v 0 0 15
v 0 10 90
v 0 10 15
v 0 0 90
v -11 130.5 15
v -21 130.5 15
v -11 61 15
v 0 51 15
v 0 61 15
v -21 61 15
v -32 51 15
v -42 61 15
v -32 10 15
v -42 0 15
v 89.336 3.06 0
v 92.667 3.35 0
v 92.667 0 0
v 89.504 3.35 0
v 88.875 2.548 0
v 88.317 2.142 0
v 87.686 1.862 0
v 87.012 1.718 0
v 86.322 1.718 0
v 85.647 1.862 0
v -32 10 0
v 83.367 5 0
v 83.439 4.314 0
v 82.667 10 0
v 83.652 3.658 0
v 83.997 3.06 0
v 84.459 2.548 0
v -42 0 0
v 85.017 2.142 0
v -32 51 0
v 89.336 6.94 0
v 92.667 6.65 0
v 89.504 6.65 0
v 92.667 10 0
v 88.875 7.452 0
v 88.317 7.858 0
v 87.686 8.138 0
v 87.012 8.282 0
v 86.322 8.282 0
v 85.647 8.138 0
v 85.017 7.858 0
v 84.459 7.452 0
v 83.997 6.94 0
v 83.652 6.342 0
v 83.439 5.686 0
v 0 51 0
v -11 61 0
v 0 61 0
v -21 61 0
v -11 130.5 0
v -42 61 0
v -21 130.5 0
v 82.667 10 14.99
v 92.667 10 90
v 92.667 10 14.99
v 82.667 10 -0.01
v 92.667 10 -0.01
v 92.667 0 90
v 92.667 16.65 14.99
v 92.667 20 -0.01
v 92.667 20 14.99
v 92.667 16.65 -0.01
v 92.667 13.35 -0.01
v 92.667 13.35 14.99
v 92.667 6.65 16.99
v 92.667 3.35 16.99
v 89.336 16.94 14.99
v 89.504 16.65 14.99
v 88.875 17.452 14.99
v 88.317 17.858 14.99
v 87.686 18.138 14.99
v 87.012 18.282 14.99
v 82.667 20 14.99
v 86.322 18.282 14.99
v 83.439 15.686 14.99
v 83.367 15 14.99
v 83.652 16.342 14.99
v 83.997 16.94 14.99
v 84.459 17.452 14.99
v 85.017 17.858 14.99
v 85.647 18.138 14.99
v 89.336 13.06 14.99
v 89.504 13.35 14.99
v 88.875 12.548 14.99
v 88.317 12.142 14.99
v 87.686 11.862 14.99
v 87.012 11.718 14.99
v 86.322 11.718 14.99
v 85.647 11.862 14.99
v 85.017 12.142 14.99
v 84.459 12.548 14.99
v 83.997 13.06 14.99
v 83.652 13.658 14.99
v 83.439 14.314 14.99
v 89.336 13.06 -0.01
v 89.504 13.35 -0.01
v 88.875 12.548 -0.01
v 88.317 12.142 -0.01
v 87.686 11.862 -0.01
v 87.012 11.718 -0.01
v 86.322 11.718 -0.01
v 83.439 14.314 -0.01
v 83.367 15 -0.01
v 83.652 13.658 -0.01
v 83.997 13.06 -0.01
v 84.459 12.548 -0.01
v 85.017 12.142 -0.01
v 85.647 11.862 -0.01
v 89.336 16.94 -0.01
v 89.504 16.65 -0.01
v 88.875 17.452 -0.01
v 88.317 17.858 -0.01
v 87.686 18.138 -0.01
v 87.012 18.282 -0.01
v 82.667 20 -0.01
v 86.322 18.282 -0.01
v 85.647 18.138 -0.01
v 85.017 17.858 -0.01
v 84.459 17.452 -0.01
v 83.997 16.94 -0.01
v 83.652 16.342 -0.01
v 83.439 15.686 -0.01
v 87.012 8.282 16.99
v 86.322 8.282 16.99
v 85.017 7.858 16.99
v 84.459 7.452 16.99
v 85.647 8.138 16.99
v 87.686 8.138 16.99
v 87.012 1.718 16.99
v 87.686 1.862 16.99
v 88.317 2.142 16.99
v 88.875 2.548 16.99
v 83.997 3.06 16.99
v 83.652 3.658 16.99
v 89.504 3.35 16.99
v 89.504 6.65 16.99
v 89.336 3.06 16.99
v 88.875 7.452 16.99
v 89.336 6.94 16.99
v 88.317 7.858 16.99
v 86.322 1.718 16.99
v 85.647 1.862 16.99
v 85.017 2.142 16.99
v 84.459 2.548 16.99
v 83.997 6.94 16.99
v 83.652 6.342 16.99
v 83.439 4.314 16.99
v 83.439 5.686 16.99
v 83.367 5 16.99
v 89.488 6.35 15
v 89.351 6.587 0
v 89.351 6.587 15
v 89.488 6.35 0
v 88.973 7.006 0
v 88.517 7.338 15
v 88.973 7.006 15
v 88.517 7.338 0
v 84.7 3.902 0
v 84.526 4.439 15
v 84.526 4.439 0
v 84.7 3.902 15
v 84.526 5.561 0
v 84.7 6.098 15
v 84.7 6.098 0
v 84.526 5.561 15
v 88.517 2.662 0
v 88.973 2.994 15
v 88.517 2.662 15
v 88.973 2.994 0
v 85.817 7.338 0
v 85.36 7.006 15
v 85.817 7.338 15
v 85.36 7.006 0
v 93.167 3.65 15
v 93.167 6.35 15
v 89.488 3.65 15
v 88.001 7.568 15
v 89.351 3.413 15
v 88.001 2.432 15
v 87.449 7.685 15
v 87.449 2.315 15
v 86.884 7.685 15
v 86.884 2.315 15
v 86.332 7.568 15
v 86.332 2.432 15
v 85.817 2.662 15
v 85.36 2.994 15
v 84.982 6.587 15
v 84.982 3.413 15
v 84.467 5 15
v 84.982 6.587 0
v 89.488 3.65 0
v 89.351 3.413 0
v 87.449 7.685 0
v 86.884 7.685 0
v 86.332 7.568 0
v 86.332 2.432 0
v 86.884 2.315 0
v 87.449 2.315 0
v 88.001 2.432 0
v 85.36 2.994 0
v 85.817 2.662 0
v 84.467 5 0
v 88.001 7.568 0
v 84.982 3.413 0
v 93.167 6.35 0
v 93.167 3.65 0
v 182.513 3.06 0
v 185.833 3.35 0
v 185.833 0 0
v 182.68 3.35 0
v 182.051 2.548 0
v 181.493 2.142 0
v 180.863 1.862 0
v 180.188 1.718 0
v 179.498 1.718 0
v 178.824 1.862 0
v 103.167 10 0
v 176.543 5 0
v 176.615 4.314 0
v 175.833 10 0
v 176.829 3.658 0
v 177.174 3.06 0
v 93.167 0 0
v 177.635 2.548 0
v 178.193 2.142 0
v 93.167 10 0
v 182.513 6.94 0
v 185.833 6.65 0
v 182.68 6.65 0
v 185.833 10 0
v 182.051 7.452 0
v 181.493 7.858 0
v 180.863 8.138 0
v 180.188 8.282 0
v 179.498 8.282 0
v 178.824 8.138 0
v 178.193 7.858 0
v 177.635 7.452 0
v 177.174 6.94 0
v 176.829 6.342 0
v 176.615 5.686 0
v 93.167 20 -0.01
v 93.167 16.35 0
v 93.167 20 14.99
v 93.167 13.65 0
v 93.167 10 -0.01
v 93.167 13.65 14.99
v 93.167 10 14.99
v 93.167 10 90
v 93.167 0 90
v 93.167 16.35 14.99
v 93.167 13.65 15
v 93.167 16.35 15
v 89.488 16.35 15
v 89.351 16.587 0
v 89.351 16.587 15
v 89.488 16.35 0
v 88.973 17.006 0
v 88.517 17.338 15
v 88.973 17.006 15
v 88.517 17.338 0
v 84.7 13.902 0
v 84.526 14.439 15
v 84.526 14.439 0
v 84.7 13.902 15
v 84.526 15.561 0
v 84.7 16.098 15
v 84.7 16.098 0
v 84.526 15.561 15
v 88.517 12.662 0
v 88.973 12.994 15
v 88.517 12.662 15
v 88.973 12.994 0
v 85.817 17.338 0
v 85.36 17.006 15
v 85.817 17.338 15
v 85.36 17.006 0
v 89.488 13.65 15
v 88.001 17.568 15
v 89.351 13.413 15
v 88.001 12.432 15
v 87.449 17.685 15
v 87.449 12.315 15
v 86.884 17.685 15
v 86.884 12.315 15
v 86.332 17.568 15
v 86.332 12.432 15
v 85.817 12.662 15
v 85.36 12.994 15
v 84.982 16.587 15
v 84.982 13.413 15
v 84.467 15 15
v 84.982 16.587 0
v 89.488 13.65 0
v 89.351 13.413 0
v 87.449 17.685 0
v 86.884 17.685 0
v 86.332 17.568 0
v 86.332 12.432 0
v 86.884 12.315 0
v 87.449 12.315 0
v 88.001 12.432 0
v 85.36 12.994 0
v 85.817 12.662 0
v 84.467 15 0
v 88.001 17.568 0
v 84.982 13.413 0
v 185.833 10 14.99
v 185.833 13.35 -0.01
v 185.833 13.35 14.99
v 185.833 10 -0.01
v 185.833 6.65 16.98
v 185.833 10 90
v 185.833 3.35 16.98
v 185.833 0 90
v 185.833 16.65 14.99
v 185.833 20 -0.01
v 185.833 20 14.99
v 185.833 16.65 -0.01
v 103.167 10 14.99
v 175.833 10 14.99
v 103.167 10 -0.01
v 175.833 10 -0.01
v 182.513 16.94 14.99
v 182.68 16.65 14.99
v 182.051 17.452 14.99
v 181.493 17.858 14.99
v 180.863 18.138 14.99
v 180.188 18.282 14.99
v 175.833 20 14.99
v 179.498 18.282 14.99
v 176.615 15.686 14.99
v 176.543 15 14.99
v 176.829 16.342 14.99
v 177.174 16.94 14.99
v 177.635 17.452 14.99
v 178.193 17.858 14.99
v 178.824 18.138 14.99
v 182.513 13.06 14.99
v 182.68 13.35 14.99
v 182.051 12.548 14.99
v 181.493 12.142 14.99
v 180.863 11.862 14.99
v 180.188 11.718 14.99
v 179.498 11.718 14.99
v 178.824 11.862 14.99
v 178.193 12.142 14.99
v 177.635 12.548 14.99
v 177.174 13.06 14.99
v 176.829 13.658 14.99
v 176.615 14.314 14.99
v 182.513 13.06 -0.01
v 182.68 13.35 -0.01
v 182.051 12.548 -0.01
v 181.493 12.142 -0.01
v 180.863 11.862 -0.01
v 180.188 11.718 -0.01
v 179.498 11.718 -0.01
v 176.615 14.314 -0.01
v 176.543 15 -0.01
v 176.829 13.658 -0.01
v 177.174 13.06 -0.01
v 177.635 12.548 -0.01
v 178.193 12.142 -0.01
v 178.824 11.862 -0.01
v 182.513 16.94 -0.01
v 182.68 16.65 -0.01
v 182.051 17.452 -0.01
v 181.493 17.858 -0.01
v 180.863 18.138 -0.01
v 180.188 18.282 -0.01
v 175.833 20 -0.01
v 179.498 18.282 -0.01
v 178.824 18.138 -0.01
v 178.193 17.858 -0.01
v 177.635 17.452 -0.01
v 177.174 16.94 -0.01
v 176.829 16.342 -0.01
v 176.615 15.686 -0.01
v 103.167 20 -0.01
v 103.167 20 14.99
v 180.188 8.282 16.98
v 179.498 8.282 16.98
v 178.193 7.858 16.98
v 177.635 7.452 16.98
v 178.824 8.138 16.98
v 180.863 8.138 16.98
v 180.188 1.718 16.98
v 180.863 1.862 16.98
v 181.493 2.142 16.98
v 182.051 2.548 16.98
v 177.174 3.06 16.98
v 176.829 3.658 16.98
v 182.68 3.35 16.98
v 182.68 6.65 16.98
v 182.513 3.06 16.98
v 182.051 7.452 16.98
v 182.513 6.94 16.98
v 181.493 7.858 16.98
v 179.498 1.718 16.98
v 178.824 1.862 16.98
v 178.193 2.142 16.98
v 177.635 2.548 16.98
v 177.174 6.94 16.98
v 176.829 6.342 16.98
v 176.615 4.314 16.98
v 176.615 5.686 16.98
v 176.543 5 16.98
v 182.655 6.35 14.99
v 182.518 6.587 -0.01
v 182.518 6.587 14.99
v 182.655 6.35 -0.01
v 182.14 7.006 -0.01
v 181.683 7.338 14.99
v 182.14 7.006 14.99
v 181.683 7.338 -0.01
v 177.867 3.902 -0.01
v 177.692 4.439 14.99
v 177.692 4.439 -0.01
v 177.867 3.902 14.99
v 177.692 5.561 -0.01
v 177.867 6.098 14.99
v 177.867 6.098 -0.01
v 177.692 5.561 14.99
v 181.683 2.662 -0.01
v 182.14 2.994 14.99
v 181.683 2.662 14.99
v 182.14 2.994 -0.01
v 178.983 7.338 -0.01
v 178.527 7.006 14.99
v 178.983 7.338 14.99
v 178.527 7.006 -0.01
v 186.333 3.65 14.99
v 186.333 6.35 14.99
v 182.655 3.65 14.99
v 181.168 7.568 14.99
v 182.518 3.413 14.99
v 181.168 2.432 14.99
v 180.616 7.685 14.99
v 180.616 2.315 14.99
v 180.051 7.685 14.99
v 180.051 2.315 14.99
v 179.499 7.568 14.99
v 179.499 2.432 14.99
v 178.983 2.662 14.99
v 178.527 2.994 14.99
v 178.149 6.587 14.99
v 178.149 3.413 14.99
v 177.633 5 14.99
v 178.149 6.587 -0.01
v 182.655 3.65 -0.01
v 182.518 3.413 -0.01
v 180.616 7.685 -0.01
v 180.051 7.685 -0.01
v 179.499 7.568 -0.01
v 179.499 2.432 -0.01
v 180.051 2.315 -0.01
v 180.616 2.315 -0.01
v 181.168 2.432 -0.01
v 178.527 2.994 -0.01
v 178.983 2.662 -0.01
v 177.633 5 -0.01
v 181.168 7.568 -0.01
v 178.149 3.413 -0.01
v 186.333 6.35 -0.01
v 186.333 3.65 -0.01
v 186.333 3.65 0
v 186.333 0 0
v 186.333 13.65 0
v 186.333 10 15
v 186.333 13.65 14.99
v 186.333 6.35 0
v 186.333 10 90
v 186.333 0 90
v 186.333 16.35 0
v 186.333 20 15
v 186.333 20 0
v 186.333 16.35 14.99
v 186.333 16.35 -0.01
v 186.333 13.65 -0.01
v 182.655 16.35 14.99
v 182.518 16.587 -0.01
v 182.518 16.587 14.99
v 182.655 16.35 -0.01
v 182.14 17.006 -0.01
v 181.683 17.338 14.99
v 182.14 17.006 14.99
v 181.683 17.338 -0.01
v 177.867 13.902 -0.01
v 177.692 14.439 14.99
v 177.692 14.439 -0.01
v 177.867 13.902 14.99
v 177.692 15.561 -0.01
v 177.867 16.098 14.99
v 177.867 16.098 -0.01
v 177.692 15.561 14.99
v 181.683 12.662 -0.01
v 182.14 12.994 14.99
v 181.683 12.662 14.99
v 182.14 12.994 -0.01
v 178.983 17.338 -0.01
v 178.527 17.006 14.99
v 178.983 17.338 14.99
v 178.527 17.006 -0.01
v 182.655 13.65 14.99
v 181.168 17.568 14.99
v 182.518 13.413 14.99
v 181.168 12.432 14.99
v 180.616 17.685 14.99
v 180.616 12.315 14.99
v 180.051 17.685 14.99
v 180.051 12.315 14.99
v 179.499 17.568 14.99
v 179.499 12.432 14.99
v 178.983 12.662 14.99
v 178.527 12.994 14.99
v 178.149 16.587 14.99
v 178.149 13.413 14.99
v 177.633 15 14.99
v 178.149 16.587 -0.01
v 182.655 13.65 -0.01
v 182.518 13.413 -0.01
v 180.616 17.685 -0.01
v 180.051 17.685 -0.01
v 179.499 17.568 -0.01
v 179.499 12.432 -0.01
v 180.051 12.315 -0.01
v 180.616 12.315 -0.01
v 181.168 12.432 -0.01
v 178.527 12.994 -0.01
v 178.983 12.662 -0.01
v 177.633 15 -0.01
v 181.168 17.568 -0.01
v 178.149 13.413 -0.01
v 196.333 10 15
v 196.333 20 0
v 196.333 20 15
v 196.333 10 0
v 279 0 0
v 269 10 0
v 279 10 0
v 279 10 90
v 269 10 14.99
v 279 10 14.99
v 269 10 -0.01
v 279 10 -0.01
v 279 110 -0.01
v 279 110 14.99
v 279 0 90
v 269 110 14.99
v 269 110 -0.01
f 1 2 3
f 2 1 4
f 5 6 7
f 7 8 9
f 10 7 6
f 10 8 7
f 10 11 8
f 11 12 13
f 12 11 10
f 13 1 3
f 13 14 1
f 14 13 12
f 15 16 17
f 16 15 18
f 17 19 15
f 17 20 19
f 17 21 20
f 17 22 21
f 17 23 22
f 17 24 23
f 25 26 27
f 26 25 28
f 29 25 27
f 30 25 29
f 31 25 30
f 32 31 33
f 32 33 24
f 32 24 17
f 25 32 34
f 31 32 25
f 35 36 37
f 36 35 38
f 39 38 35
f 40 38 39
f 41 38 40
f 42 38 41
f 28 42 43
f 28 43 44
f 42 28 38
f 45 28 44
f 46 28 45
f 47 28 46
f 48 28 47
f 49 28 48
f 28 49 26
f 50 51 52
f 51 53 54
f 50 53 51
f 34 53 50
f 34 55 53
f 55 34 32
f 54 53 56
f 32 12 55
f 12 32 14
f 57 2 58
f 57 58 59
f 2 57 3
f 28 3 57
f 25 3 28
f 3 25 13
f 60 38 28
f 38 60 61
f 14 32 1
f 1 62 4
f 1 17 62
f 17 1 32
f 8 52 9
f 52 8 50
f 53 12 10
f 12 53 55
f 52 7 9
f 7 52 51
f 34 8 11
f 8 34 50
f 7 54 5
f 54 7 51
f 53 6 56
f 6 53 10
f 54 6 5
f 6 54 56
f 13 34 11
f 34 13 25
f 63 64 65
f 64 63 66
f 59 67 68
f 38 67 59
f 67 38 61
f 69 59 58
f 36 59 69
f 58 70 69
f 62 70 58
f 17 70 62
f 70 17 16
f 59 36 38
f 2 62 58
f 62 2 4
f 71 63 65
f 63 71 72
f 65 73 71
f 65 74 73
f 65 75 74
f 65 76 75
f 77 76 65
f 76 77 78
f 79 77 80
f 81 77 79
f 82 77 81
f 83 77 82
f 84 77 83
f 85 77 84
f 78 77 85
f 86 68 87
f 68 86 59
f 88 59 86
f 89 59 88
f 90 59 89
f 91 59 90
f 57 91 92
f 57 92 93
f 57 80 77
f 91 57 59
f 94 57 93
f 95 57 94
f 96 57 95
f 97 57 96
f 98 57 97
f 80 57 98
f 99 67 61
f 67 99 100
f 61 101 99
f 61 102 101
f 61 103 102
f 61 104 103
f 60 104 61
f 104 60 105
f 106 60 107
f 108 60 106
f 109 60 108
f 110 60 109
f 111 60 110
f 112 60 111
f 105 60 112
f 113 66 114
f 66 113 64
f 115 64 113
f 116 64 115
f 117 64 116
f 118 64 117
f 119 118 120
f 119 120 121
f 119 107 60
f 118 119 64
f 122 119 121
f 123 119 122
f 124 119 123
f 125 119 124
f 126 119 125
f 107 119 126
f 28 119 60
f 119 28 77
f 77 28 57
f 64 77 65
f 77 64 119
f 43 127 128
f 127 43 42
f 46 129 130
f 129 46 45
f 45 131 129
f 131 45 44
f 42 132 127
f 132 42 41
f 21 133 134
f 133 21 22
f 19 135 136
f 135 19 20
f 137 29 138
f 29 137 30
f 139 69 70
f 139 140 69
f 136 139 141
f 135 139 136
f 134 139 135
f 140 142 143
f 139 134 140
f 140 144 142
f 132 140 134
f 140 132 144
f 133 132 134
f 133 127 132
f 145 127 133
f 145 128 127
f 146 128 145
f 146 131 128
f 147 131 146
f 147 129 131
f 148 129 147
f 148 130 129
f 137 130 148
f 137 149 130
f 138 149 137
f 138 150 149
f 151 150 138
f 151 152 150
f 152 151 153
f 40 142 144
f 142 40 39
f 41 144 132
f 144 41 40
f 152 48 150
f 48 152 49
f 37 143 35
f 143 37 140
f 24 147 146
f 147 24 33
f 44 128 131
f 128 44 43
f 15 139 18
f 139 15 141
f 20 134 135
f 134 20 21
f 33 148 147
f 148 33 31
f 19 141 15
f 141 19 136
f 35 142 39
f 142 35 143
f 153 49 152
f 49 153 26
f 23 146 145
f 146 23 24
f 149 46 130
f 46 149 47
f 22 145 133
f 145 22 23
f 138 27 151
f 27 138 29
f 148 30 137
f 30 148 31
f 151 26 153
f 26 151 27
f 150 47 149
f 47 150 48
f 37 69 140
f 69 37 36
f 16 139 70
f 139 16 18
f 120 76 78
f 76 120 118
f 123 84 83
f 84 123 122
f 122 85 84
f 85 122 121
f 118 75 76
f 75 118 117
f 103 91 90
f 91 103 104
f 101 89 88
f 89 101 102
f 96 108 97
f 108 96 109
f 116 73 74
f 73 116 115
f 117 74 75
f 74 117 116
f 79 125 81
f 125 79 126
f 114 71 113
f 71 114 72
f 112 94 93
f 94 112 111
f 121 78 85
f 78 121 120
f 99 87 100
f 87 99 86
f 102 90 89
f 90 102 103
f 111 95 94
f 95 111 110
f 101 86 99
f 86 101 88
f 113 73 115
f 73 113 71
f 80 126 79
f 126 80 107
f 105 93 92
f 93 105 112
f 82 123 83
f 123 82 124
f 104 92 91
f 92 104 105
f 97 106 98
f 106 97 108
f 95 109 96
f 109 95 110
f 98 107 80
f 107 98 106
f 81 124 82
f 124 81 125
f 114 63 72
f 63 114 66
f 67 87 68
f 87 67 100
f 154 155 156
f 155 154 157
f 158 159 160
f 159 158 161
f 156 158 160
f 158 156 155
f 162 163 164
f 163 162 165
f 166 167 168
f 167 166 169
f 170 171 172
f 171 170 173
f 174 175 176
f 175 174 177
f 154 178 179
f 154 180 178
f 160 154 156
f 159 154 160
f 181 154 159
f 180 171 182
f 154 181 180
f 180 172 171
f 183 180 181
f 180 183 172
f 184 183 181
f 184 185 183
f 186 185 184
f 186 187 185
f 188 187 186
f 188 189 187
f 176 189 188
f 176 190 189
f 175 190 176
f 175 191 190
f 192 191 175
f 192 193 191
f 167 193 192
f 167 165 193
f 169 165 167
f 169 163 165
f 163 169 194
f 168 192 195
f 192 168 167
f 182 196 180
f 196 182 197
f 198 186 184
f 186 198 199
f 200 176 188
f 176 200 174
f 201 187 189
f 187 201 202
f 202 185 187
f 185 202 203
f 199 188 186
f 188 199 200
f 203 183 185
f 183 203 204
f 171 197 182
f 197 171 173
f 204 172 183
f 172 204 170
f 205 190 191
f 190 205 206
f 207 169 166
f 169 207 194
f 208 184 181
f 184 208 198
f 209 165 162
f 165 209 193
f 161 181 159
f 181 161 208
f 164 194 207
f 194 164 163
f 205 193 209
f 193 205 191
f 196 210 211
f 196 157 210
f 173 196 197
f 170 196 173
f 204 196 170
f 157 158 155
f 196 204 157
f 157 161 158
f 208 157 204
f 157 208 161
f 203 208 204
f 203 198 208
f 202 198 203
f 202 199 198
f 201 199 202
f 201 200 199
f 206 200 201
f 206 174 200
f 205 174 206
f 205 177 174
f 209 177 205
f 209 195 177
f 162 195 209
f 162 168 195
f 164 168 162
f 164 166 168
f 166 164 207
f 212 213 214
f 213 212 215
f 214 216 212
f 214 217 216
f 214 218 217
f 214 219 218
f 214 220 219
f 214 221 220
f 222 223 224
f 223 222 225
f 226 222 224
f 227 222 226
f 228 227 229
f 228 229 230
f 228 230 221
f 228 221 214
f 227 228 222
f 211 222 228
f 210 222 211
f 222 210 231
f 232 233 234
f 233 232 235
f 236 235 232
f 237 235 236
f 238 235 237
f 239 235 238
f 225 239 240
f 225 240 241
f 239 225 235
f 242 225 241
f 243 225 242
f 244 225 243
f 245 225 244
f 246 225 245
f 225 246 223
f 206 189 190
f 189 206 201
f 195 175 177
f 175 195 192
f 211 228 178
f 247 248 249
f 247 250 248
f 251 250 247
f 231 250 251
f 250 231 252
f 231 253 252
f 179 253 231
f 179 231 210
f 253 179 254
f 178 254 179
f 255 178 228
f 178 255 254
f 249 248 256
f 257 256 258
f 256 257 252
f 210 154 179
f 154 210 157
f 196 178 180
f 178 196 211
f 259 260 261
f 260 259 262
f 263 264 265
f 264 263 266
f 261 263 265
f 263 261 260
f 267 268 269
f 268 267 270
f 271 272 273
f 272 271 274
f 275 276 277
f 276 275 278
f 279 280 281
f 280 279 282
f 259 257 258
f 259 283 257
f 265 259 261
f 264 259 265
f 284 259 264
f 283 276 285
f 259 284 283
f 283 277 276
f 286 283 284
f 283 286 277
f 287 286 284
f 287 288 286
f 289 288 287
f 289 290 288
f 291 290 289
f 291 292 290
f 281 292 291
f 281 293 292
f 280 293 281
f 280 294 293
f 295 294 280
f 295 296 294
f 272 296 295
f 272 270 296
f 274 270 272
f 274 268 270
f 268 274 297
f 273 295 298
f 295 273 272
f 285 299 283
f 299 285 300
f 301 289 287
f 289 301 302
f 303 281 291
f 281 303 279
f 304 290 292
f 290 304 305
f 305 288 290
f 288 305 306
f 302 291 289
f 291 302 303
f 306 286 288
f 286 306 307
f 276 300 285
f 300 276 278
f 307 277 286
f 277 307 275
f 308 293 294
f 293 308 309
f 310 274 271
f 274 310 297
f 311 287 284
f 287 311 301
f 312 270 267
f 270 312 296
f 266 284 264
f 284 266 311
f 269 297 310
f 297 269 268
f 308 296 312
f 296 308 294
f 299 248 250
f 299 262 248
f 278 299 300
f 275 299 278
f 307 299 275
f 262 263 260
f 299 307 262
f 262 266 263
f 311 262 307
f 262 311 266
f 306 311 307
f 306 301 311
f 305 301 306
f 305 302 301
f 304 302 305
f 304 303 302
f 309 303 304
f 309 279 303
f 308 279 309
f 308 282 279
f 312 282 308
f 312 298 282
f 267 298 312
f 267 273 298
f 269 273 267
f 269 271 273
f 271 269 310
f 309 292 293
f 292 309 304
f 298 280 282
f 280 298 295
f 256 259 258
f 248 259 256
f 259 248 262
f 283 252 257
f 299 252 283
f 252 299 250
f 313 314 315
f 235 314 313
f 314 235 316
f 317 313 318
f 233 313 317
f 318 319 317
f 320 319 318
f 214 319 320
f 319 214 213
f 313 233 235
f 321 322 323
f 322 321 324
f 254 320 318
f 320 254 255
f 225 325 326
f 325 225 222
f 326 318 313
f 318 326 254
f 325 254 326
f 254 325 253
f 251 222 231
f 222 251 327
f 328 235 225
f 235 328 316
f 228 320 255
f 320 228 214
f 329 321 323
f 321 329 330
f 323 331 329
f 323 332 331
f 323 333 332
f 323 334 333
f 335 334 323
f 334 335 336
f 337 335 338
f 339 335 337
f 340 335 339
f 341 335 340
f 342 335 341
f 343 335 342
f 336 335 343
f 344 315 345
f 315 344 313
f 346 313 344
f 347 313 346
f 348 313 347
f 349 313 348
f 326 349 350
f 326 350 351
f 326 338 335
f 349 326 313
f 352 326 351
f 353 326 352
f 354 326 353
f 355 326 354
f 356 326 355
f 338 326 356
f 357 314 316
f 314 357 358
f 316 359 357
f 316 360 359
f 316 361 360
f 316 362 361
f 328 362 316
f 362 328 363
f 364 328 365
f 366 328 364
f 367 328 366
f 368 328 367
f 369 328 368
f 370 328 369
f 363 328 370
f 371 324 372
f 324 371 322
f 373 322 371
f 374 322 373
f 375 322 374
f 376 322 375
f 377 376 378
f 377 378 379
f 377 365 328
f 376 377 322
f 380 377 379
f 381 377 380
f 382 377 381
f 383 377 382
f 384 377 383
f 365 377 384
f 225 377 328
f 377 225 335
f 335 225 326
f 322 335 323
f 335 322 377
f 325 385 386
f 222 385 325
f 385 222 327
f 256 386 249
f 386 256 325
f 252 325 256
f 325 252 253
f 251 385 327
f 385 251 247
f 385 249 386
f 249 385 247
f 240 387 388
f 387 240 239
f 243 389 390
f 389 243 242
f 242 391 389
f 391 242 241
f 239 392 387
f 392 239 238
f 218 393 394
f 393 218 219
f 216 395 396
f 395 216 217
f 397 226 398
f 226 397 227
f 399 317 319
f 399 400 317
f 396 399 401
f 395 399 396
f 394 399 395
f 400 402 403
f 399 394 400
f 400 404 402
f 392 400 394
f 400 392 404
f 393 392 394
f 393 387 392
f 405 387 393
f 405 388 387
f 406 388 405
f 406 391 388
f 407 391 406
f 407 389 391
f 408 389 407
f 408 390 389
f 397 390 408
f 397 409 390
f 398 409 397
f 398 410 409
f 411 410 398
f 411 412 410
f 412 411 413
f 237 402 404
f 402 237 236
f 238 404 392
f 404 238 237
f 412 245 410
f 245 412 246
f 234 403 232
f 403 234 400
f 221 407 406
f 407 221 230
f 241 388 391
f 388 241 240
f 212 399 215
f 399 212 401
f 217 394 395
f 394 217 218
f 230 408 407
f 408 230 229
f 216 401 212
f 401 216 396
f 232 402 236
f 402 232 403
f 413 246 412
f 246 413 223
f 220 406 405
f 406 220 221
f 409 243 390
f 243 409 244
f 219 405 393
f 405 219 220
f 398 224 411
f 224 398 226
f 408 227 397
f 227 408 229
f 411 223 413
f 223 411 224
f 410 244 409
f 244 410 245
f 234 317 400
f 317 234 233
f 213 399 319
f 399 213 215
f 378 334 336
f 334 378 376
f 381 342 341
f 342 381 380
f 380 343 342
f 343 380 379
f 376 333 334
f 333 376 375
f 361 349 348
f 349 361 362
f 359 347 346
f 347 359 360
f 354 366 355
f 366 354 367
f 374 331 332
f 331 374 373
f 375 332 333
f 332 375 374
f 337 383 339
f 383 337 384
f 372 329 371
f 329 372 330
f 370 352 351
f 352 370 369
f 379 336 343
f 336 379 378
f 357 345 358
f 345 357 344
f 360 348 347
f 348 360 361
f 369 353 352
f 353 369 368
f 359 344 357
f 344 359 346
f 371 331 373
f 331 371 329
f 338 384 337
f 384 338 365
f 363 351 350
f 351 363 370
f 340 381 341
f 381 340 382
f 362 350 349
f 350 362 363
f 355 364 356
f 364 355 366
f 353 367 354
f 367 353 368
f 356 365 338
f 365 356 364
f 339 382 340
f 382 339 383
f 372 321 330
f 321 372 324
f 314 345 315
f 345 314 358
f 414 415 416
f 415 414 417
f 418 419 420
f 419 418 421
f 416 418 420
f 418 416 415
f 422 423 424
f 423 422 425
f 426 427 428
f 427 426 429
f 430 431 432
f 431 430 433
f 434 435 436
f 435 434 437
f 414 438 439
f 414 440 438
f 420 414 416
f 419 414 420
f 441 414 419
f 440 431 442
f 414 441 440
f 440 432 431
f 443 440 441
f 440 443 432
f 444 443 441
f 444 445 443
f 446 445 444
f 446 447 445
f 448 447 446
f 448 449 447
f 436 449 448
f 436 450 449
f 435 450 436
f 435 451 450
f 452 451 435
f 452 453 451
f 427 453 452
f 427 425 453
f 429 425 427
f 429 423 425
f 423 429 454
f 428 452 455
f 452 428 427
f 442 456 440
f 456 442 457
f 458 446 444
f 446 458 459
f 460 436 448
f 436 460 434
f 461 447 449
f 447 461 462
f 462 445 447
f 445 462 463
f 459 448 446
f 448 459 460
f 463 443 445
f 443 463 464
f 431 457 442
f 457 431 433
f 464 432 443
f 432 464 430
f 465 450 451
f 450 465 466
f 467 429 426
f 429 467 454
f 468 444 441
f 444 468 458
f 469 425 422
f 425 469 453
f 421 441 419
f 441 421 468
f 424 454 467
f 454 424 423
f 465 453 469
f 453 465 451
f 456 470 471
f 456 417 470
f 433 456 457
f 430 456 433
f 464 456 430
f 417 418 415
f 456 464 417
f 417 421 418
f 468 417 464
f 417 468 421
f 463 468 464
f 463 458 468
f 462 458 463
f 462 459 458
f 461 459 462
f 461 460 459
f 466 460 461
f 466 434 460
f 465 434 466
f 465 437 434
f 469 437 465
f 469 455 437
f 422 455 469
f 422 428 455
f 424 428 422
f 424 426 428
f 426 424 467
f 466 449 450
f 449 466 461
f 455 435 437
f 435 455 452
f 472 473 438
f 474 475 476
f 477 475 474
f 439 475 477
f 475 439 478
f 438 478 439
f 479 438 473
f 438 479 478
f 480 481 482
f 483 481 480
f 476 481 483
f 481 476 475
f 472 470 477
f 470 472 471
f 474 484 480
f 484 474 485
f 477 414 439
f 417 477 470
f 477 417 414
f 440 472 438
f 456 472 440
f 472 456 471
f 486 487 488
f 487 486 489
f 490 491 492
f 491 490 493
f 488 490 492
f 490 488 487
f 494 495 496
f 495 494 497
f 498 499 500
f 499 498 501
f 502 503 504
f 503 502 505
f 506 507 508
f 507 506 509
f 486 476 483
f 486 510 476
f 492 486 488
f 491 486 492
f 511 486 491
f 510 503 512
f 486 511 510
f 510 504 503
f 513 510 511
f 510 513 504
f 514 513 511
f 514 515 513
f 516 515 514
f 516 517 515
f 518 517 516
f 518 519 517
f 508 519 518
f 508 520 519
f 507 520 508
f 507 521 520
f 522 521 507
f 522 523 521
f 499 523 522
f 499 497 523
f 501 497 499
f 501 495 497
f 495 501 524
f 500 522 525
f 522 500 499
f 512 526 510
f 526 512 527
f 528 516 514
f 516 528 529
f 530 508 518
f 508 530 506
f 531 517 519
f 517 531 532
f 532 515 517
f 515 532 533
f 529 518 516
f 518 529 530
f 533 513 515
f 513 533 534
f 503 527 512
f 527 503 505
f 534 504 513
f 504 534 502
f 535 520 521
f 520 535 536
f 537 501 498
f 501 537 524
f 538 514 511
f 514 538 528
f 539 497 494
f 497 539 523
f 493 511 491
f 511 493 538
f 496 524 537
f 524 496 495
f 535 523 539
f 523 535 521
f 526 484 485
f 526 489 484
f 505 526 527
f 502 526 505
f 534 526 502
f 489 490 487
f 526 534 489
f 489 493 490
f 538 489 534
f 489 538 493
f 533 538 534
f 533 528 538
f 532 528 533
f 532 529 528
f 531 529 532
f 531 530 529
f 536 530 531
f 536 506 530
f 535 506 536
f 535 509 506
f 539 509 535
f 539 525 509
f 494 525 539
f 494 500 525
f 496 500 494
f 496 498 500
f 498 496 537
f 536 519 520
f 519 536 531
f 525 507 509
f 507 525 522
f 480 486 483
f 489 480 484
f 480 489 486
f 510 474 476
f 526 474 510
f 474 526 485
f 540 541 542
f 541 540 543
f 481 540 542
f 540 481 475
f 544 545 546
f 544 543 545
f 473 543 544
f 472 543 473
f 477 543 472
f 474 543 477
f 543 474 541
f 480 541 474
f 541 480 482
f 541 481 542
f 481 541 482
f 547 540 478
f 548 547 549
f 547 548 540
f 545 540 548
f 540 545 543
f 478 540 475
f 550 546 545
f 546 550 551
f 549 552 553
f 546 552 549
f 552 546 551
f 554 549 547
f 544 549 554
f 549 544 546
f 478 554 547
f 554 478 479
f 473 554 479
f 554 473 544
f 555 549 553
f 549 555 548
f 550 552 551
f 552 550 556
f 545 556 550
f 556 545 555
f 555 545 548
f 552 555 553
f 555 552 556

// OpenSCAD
// Use partname to control which object is being rendered:
//
// _partname_values blocker_left blocker_middle blocker_right
partname = "display";

underspace_wd = [21,61];
space_width = 278;
support_depth = 100;
beam_wh = [10,15];
blocker_height = 90;


// $fa is the minimum angle for a fragment. Minimum value is 0.01.
$fa = 12;
// $fs is the minimum size of a fragment. If high, causes
// fewer-than-$fa-would-indicate surfaces. Minimum is 0.01.
$fs = 0.5;

space_width_left = space_width/3;
space_width_right = space_width/3;
space_width_middle = space_width - space_width_left - space_width_right;

keyhole_dimen = min(beam_wh[0],beam_wh[1])/2-2;
keyholes_yoffs = [0.5*beam_wh[0],1.5*beam_wh[0]];

module keyhole (scalefactor,height)
{
  dim = scalefactor*keyhole_dimen;
  cylinder(r=dim, h=height);
  translate([0,-dim/2,0])
    cube([2*keyhole_dimen,dim,height]);
}

module blocker_left()
{
  difference()
  {
    union()
    {
      // y==0 reach-left beam
      translate([-2*underspace_wd[0],0,0])
        cube([2*underspace_wd[0],beam_wh[0],beam_wh[1]]);

      // y==underspace_wd[1] reach-left beam
      translate([-2*underspace_wd[0],underspace_wd[1]-beam_wh[0],0])
        cube([2*underspace_wd[0],beam_wh[0],beam_wh[1]]);

      // lengthy underspace filler:
      translate([-underspace_wd[0],underspace_wd[1],0])
        cube([beam_wh[0],support_depth-underspace_wd[1]/2,beam_wh[1]]);

      /* // underspace reacher to avoid getting pushed away */
      /* mirror([1,0,0]) */
      /*   cube([2*underspace_wd[0],underspace_wd[1],beam_wh[1]]); */
      translate([-2*underspace_wd[0],0,0])
        cube([beam_wh[0],underspace_wd[1],beam_wh[1]]);

      // lengthy underspace filler:
      /* cube([beam_wh[0],support_depth,beam_wh[1]]); */
      cube([space_width_left,beam_wh[0],blocker_height]);
      translate([space_width_left-beam_wh[0],beam_wh[0],-0.01])
        cube([beam_wh[0],beam_wh[0],beam_wh[1]]);
    }

  for (yoff = keyholes_yoffs)
    translate([space_width_left-2*keyhole_dimen,yoff,-0.01])
      keyhole(1.1,2+beam_wh[1]);
  }
}

module blocker_middle()
{
  difference()
  {
    union()
    {
      for (yoff = keyholes_yoffs)
        translate([-2*keyhole_dimen,yoff,0])
          keyhole(0.9,beam_wh[1]);
      cube([space_width_left,beam_wh[0],blocker_height]);
      translate([space_width_left-beam_wh[0],beam_wh[0],-0.01])
        cube([beam_wh[0],beam_wh[0],beam_wh[1]]);

      translate([0,beam_wh[0],-0.01])
        cube([beam_wh[0],beam_wh[0],beam_wh[1]]);
    }
    union()
    {
      for (yoff = keyholes_yoffs)
        translate([space_width_left-2*keyhole_dimen+0.01,yoff,-0.02])
          keyhole(1.1,2+beam_wh[1]);
    }
  }
}

module blocker_right()
{
  difference()
  {
    union()
    {
      for (yoff = keyholes_yoffs)
        translate([-2*keyhole_dimen,yoff,-0.01])
          keyhole(0.9,beam_wh[1]);
      translate([0,beam_wh[0],0])
        cube([beam_wh[0],beam_wh[0],beam_wh[1]]);
      cube([space_width_right,beam_wh[0],blocker_height]);
      translate([space_width_left-beam_wh[0],beam_wh[0],-0.01])
        cube([beam_wh[0],support_depth,beam_wh[1]]);
    }
  }
}


// Conventions:
// * When an object is rendered using partname, position/rotate it according to
//   printing suggestion, here. (The module itself will be positioned/rotated
//   like it will be, in the put-together "display" situation.)
// * The special value "display" for partname is the product picture for all
//   parts put together.
if ("display" == partname)
{
  blocker_left();
  translate([space_width_left+0.5,0,0])
    blocker_middle();
  translate([space_width_left+0.5+space_width_middle+0.5,0,0])
    blocker_right();
} else if ("blocker_left" == partname)
{
  blocker_left();
} else if ("blocker_middle" == partname)
{
  blocker_middle();
} else if ("blocker_right" == partname)
{
  blocker_right();
}
